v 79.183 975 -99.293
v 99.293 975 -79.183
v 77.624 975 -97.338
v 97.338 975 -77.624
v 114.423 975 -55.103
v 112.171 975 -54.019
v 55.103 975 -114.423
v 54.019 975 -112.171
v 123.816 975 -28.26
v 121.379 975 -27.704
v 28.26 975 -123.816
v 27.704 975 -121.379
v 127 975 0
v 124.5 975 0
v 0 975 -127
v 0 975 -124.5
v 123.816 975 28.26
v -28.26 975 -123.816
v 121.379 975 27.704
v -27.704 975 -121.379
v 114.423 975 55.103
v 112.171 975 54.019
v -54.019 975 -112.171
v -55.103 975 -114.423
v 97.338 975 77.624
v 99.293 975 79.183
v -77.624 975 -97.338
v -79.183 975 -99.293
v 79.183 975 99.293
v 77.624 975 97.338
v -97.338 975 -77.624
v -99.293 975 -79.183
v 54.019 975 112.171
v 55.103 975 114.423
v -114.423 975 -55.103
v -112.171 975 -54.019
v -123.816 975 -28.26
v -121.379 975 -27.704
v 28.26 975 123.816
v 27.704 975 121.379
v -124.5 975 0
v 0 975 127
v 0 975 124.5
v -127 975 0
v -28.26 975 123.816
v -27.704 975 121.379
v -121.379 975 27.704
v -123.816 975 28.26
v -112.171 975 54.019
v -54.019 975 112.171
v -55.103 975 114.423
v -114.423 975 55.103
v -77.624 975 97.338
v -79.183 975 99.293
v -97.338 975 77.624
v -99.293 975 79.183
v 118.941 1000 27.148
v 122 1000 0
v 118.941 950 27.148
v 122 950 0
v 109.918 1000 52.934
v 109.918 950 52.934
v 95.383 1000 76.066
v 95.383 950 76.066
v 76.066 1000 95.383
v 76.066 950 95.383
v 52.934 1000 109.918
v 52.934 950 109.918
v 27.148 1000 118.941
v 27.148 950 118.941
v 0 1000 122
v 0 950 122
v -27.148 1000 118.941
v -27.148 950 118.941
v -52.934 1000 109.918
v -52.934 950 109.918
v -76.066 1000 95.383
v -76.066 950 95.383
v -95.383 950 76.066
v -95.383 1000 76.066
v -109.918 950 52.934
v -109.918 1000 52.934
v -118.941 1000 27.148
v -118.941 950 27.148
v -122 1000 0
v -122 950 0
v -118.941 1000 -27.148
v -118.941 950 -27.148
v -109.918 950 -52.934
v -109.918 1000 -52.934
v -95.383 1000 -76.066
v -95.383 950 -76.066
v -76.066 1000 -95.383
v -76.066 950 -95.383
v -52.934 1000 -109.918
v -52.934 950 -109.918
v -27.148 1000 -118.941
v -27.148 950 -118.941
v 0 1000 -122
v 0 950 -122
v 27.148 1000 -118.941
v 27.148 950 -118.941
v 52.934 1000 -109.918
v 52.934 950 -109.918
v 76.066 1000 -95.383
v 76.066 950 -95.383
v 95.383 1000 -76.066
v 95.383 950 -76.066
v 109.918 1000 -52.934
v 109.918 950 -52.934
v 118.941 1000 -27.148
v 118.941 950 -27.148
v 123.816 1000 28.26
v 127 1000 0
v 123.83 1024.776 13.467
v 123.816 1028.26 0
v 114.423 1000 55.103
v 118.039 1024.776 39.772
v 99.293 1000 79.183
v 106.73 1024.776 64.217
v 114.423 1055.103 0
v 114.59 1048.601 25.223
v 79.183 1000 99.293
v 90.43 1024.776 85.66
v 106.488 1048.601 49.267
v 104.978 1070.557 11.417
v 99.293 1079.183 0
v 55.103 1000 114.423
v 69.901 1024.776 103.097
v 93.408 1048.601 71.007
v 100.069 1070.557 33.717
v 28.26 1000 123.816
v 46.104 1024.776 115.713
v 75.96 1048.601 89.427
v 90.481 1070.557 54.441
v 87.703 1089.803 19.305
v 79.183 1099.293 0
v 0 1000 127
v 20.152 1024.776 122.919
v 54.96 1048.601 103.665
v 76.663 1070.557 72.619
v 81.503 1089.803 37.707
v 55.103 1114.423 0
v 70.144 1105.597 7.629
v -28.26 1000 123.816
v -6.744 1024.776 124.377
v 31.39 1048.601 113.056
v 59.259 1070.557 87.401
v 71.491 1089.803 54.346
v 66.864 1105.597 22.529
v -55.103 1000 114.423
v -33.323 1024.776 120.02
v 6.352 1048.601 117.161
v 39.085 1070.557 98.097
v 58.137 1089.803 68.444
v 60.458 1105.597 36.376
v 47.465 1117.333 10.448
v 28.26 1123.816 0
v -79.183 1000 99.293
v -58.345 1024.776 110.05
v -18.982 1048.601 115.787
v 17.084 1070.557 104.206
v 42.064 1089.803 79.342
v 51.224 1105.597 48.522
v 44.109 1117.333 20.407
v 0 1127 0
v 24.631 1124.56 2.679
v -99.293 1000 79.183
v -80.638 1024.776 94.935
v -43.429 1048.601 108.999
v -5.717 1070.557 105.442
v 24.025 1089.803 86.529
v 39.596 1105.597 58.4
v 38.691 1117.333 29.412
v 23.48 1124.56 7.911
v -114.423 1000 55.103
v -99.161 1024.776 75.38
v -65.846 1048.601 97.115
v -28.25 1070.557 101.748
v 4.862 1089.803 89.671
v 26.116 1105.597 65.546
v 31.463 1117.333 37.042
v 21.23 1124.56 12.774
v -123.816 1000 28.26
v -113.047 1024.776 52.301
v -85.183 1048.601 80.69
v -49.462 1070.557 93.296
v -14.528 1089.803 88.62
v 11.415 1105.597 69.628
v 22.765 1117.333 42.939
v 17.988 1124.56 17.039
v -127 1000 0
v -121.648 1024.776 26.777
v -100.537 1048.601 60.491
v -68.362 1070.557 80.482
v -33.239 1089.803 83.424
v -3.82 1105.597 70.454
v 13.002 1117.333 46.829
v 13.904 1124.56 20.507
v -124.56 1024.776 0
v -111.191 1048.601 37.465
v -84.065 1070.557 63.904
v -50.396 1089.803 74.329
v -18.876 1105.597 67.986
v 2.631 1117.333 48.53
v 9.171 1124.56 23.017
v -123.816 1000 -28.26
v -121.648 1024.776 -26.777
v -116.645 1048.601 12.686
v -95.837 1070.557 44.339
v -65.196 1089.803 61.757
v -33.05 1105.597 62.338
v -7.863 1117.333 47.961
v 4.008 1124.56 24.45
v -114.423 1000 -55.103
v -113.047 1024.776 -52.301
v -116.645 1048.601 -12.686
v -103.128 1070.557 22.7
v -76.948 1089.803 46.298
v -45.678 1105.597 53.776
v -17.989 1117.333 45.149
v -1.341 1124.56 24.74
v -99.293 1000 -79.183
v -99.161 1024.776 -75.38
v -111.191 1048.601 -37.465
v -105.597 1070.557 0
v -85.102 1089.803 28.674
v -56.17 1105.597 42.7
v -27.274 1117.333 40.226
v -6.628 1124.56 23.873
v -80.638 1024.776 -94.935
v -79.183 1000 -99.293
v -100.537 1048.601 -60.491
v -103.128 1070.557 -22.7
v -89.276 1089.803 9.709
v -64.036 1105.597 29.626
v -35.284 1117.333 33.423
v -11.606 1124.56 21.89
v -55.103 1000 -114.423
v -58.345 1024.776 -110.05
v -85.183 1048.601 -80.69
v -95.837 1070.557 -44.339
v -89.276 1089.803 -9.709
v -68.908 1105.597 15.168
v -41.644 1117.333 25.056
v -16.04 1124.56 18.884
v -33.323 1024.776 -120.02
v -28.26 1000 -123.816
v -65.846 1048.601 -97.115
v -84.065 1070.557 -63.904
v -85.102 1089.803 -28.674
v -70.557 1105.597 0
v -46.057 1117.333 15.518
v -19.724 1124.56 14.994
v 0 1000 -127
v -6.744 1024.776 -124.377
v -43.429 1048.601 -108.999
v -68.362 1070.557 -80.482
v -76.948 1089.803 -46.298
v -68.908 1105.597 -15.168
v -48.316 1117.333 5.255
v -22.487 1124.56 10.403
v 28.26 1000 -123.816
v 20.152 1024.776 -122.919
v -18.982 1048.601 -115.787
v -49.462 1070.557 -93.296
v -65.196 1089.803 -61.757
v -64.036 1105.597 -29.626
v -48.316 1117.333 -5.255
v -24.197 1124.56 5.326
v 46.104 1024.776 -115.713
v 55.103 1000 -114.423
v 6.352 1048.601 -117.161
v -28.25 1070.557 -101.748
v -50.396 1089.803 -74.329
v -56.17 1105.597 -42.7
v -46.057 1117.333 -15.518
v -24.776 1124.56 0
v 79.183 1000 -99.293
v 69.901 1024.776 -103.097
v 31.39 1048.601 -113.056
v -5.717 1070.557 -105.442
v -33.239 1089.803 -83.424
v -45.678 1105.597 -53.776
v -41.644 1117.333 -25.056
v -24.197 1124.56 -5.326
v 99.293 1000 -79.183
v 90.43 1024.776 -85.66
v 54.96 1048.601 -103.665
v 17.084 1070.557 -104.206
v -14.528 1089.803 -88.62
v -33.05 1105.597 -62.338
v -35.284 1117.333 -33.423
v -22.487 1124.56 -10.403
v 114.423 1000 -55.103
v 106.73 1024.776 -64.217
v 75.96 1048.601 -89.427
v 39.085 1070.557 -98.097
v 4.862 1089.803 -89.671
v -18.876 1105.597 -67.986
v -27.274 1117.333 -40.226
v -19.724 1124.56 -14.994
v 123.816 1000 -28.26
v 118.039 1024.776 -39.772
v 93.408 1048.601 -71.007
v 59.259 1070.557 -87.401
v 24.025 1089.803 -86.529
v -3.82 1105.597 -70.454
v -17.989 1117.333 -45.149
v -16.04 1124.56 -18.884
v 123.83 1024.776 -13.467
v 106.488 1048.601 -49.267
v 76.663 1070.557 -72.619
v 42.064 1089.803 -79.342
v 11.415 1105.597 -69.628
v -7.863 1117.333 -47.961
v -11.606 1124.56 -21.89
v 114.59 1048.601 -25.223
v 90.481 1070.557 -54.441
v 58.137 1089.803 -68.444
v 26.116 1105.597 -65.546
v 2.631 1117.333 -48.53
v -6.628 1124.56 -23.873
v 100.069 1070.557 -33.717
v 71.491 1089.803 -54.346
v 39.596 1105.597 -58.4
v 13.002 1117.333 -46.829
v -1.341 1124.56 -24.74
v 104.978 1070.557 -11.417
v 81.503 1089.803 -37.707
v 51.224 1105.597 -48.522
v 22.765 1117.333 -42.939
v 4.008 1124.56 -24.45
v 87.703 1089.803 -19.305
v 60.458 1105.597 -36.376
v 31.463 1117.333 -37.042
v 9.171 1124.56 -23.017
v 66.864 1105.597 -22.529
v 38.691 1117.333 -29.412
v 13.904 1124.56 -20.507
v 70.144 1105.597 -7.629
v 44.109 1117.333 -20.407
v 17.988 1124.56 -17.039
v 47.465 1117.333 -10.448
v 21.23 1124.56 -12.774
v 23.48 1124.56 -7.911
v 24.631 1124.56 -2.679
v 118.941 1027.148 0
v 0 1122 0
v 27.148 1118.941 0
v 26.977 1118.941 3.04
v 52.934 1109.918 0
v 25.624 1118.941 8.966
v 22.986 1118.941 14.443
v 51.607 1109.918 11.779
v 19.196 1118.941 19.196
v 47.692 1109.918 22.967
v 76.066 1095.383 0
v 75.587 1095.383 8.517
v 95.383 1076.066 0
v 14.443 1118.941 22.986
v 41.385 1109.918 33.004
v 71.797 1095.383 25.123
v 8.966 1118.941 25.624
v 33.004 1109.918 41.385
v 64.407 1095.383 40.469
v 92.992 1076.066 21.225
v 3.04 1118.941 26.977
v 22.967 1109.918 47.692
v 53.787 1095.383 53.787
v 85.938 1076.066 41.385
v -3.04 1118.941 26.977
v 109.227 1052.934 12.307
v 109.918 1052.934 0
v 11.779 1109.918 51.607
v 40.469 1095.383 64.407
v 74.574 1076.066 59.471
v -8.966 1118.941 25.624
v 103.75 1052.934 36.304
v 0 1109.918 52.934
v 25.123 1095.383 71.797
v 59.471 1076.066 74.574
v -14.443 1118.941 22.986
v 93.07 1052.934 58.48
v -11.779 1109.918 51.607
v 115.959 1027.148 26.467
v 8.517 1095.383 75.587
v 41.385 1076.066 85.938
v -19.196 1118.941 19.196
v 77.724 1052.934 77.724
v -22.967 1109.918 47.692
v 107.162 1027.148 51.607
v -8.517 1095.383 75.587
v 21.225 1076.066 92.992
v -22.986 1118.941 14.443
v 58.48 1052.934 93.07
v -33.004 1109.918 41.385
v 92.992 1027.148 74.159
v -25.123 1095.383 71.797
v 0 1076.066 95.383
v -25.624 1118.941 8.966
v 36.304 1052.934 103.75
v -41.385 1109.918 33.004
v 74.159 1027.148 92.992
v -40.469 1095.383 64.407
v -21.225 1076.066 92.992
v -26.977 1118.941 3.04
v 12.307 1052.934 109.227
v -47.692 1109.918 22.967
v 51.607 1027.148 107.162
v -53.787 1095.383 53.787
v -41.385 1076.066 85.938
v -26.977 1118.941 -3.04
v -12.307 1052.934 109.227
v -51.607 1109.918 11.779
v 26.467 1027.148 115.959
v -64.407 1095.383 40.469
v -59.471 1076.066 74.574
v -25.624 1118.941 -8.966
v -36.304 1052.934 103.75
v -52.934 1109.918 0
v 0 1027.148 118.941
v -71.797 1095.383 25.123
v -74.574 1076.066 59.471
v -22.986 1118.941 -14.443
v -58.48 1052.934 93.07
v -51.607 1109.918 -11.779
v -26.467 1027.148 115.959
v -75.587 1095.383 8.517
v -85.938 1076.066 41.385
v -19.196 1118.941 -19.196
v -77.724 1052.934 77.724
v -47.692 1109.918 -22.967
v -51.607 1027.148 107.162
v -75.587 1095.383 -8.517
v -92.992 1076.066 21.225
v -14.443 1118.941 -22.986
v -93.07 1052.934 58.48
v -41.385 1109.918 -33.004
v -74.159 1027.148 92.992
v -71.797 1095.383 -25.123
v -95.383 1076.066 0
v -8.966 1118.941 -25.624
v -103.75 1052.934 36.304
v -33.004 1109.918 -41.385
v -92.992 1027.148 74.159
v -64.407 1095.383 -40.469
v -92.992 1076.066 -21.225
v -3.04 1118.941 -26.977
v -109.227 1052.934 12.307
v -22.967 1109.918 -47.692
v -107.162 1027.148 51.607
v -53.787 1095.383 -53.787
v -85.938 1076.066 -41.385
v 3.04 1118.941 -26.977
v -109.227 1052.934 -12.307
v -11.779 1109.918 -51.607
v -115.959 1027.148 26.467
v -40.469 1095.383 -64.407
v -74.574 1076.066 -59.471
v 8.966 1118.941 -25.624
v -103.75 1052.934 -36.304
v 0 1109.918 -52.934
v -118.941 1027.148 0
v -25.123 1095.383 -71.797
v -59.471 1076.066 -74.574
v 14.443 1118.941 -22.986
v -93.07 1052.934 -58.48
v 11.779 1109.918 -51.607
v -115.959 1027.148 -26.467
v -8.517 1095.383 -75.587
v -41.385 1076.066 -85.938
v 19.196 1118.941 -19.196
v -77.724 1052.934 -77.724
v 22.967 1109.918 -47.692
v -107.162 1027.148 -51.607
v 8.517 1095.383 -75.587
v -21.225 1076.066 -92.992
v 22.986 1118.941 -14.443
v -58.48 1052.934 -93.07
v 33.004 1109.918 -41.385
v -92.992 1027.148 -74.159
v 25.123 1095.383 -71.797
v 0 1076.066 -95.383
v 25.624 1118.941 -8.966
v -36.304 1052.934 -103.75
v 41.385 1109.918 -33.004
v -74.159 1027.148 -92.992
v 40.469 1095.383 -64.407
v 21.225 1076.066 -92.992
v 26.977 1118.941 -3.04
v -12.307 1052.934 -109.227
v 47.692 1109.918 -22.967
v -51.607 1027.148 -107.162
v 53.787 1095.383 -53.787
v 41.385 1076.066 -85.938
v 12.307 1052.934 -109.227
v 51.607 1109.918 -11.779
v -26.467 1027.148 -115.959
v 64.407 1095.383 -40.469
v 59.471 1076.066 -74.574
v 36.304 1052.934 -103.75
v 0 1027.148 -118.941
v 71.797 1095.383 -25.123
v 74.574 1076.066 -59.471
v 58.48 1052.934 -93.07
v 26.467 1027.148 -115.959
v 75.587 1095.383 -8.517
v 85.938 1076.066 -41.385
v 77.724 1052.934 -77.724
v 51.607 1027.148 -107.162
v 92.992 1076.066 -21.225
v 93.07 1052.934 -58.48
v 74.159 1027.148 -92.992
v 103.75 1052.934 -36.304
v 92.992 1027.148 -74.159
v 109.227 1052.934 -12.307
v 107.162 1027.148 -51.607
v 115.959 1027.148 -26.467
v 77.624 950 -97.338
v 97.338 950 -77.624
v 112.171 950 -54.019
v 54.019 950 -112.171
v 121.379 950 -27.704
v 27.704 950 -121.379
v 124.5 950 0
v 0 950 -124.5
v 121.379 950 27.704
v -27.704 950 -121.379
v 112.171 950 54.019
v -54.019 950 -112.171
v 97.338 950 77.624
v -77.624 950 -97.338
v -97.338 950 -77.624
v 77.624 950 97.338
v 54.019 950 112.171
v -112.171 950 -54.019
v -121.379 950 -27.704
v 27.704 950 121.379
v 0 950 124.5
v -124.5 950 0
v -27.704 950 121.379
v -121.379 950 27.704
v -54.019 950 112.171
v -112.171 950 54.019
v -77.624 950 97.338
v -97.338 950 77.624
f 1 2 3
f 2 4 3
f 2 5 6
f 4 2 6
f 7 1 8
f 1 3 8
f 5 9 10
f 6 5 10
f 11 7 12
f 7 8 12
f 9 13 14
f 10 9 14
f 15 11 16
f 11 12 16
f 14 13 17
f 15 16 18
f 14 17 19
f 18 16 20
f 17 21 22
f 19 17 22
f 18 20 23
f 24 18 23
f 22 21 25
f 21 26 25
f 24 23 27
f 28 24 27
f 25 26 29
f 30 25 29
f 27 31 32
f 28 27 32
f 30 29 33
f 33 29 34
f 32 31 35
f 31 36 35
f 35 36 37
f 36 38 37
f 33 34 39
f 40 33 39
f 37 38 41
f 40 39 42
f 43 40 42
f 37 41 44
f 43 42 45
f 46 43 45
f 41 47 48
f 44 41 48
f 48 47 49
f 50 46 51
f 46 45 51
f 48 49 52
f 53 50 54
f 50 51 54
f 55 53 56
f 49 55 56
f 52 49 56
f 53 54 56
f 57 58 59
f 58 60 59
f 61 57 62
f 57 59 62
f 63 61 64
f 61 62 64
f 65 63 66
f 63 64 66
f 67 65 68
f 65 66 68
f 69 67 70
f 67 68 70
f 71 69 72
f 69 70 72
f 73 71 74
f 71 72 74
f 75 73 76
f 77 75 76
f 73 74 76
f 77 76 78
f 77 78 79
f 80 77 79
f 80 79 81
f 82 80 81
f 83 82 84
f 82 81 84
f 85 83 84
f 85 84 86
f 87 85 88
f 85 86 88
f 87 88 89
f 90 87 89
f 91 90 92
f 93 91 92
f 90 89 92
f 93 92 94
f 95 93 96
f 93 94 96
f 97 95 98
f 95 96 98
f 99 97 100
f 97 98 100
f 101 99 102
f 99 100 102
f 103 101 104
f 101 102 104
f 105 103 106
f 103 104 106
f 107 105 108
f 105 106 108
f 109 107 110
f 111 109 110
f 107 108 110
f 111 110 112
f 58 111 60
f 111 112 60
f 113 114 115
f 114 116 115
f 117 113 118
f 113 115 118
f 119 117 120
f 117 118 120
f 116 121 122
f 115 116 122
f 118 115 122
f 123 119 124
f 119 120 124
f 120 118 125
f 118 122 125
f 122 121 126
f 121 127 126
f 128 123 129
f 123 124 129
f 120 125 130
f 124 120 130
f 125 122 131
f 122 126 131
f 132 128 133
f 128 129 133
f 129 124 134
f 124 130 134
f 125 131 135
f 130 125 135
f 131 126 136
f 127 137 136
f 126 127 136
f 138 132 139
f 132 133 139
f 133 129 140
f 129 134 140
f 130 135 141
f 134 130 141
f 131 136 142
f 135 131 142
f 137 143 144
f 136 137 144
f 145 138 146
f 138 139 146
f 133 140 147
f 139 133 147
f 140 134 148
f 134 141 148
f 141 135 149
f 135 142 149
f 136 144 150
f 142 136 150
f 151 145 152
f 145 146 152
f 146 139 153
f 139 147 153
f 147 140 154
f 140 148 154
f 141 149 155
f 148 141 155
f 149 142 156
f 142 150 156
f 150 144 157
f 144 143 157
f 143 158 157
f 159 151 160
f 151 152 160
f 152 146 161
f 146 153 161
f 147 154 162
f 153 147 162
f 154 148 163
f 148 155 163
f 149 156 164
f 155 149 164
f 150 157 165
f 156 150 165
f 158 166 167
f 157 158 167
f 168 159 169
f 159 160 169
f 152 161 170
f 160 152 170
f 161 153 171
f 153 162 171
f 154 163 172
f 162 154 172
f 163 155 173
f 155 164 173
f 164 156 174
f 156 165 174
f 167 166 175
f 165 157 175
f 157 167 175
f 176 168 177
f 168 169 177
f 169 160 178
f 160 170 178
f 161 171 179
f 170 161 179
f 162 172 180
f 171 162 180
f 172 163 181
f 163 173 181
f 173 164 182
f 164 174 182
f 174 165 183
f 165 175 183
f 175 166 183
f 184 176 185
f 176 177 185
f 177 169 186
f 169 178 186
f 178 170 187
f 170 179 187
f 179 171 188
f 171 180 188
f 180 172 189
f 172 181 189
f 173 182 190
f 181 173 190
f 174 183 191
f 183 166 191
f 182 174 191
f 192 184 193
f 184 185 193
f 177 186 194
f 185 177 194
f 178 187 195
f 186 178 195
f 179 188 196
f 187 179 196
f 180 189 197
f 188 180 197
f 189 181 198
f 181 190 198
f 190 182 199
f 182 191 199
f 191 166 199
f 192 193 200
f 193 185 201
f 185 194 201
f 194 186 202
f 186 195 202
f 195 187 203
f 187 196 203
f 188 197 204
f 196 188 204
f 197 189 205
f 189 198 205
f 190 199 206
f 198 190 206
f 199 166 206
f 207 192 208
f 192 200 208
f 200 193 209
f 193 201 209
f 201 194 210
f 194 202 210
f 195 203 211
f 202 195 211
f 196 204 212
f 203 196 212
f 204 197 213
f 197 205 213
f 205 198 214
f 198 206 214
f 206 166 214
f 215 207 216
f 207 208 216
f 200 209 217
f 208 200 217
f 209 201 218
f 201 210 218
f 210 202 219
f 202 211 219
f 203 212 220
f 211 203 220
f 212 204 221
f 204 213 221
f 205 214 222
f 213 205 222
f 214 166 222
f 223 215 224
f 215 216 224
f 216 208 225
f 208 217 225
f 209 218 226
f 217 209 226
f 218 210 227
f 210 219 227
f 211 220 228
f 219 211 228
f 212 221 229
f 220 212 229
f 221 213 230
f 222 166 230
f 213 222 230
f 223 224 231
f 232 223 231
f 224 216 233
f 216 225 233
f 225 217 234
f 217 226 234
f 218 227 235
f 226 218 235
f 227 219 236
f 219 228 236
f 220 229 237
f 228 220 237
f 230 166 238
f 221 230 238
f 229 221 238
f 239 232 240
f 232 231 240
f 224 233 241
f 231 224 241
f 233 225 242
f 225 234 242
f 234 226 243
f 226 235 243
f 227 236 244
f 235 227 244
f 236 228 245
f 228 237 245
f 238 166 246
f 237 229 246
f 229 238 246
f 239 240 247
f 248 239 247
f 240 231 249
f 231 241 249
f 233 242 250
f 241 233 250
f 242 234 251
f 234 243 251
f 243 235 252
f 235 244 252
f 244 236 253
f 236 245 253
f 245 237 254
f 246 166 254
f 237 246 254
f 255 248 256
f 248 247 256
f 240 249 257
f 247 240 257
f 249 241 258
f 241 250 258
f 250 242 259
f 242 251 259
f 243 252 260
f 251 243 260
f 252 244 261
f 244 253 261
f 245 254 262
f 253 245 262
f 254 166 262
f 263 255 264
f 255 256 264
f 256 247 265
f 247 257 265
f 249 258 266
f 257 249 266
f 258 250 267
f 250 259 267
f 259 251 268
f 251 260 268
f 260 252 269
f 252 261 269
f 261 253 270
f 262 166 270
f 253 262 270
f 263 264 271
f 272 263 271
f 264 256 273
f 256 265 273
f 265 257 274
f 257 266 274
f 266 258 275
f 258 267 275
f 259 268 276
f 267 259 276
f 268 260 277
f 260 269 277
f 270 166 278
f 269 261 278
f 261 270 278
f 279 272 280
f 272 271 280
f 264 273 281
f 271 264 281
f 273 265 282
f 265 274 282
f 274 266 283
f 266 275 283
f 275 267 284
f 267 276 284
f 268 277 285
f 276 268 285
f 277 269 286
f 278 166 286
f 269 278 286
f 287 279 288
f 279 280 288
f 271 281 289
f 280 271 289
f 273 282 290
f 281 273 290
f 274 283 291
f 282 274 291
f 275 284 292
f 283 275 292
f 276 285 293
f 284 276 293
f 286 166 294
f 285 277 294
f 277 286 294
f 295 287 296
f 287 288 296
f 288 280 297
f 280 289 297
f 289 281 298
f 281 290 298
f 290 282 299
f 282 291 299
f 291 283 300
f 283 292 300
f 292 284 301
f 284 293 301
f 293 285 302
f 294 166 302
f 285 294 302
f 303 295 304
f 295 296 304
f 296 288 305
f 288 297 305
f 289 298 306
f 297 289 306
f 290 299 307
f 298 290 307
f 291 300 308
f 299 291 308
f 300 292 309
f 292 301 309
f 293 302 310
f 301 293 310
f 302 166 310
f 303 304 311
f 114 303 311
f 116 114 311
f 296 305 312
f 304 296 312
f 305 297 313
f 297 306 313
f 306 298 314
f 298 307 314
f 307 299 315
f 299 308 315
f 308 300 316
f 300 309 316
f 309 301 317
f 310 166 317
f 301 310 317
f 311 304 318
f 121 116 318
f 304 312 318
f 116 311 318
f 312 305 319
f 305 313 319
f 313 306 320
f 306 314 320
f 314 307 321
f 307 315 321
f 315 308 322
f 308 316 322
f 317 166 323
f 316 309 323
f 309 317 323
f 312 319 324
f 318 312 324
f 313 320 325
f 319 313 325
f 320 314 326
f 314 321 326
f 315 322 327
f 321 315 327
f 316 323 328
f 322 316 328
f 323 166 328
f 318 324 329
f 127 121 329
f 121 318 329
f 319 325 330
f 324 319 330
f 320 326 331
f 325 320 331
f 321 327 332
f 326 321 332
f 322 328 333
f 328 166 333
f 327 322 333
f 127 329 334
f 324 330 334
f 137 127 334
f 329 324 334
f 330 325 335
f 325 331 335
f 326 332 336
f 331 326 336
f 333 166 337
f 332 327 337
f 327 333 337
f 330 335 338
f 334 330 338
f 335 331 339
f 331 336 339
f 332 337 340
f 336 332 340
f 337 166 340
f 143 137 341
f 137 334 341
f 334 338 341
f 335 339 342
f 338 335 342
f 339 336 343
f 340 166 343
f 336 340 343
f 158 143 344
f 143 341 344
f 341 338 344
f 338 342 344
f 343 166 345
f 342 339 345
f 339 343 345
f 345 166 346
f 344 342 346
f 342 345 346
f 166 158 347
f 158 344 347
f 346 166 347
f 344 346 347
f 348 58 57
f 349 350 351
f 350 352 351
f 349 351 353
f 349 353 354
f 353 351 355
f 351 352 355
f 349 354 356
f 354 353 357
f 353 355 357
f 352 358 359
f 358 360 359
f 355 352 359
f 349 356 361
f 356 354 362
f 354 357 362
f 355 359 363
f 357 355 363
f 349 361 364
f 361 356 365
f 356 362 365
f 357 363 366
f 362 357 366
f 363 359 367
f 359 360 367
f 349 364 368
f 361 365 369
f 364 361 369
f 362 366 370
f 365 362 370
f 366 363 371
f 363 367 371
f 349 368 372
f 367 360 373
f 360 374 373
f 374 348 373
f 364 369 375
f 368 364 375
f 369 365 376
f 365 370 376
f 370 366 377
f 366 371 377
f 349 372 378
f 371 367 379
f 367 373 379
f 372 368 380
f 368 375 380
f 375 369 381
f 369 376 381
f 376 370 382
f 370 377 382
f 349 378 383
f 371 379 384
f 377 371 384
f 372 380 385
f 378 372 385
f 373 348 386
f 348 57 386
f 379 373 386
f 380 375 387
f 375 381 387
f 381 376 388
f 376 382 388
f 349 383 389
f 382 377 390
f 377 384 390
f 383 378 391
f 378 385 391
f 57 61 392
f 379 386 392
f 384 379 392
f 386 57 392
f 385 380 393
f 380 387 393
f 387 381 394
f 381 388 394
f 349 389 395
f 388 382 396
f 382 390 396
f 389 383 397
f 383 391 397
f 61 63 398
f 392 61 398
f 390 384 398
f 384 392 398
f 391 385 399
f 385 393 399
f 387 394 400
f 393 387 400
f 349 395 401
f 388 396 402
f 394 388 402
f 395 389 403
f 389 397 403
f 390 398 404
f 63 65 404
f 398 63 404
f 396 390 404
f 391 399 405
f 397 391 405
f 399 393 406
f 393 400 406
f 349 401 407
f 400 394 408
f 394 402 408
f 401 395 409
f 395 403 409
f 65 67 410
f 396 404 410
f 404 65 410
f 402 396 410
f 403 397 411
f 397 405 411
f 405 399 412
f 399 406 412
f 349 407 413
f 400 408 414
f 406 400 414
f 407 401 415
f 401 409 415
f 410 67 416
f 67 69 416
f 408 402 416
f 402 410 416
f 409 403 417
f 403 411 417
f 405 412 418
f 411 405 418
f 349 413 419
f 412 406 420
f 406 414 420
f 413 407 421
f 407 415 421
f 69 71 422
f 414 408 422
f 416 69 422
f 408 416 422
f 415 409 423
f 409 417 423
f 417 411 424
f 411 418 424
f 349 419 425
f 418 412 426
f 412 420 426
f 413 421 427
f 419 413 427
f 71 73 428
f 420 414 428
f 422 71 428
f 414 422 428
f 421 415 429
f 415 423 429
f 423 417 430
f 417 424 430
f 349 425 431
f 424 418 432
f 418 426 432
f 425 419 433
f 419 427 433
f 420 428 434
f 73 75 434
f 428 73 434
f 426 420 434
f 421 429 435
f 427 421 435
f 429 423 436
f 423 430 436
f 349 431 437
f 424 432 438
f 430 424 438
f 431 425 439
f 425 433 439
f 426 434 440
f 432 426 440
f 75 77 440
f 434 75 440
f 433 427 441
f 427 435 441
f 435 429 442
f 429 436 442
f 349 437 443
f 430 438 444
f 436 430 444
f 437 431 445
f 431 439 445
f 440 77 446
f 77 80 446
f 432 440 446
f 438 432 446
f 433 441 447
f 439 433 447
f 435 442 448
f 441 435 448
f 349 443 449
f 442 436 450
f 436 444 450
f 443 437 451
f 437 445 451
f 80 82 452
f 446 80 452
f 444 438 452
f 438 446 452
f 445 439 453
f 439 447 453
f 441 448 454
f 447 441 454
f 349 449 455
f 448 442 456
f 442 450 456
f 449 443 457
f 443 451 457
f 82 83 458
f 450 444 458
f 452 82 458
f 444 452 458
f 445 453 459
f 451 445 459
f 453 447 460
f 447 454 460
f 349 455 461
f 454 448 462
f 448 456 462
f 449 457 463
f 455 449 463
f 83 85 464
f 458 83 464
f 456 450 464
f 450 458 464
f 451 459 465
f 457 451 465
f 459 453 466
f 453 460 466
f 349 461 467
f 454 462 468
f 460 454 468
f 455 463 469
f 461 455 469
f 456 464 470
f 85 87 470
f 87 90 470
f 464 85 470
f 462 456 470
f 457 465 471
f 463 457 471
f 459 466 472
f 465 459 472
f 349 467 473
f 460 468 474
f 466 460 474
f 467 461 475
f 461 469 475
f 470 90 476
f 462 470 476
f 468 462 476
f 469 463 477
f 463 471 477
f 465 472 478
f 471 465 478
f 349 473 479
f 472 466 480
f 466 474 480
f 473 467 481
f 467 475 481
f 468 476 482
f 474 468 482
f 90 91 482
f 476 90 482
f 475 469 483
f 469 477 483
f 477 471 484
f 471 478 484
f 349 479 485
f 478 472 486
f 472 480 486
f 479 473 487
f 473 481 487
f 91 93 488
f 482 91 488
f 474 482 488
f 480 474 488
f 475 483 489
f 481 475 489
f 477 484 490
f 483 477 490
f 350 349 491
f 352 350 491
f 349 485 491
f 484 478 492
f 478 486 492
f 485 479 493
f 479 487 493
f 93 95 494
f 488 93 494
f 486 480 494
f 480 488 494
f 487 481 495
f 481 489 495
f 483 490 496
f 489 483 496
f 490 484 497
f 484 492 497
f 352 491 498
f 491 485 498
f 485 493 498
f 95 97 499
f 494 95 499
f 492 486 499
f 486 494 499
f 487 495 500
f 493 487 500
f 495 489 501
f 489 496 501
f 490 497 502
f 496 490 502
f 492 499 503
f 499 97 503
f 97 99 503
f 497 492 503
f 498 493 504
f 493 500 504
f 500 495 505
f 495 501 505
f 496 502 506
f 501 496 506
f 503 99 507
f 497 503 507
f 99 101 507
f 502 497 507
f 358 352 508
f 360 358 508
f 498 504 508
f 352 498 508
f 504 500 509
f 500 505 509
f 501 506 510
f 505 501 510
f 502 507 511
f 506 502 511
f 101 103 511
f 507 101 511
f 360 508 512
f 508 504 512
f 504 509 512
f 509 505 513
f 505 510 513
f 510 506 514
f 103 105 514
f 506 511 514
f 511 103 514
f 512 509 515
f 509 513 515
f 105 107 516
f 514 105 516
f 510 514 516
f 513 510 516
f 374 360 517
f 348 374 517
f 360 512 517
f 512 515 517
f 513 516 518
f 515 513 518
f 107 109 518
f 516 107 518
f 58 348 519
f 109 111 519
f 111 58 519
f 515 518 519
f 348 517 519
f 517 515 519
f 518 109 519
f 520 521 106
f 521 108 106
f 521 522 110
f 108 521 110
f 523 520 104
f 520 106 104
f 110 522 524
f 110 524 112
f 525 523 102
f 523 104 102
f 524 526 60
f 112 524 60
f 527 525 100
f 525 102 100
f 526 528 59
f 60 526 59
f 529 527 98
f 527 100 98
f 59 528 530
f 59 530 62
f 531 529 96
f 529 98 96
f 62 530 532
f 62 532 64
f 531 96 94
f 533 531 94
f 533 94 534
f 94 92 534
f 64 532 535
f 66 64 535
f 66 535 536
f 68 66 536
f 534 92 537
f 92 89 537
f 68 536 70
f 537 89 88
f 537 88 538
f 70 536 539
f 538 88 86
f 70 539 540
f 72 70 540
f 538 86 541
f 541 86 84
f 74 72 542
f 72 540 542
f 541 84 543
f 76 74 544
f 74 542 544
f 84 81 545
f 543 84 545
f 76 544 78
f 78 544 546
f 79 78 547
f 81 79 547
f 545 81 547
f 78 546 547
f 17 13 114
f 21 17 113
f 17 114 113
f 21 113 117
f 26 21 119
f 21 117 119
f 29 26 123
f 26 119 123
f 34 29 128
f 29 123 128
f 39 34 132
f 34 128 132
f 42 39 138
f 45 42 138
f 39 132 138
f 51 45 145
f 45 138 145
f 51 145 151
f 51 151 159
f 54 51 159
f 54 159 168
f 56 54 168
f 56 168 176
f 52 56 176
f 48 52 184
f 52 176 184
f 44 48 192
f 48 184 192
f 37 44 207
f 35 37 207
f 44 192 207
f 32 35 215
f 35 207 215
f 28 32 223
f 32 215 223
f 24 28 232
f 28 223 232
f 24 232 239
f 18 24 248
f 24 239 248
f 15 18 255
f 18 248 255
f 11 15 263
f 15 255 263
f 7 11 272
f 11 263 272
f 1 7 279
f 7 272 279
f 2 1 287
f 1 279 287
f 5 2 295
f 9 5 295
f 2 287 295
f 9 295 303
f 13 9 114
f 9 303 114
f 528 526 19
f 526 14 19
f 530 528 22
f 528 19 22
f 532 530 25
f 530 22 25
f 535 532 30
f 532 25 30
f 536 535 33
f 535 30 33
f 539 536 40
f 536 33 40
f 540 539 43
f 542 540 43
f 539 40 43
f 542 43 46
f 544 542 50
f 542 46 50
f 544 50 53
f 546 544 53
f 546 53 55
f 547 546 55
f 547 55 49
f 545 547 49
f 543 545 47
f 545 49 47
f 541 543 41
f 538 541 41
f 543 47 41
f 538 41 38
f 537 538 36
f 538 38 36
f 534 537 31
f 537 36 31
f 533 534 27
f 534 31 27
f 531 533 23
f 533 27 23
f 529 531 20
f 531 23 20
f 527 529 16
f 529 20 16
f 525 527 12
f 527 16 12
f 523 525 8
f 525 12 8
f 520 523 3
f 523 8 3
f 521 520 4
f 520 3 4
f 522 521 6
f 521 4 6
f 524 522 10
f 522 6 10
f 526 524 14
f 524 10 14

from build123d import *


with BuildPart() as part:
    # Sketch1 → Revolve1 (revolve)
    with BuildSketch(Plane.XY):
        with BuildLine():
            Line((0, 1127), (0, 1122))
            ThreePointArc((0, 1122), (86.267027305, 1086.267027305), (122, 1000))
            Line((122, 1000), (122, 950))
            Line((122, 950), (124.5, 950))
            Line((124.5, 950), (124.5, 975))
            Line((124.5, 975), (127, 975))
            Line((127, 975), (127, 1000))
            ThreePointArc((127, 1000), (89.802561211, 1089.802561211), (0, 1127))
        make_face()
    revolve(axis=Axis((0, 1000, 0), (0, -1, 0)))


solid = part.part
